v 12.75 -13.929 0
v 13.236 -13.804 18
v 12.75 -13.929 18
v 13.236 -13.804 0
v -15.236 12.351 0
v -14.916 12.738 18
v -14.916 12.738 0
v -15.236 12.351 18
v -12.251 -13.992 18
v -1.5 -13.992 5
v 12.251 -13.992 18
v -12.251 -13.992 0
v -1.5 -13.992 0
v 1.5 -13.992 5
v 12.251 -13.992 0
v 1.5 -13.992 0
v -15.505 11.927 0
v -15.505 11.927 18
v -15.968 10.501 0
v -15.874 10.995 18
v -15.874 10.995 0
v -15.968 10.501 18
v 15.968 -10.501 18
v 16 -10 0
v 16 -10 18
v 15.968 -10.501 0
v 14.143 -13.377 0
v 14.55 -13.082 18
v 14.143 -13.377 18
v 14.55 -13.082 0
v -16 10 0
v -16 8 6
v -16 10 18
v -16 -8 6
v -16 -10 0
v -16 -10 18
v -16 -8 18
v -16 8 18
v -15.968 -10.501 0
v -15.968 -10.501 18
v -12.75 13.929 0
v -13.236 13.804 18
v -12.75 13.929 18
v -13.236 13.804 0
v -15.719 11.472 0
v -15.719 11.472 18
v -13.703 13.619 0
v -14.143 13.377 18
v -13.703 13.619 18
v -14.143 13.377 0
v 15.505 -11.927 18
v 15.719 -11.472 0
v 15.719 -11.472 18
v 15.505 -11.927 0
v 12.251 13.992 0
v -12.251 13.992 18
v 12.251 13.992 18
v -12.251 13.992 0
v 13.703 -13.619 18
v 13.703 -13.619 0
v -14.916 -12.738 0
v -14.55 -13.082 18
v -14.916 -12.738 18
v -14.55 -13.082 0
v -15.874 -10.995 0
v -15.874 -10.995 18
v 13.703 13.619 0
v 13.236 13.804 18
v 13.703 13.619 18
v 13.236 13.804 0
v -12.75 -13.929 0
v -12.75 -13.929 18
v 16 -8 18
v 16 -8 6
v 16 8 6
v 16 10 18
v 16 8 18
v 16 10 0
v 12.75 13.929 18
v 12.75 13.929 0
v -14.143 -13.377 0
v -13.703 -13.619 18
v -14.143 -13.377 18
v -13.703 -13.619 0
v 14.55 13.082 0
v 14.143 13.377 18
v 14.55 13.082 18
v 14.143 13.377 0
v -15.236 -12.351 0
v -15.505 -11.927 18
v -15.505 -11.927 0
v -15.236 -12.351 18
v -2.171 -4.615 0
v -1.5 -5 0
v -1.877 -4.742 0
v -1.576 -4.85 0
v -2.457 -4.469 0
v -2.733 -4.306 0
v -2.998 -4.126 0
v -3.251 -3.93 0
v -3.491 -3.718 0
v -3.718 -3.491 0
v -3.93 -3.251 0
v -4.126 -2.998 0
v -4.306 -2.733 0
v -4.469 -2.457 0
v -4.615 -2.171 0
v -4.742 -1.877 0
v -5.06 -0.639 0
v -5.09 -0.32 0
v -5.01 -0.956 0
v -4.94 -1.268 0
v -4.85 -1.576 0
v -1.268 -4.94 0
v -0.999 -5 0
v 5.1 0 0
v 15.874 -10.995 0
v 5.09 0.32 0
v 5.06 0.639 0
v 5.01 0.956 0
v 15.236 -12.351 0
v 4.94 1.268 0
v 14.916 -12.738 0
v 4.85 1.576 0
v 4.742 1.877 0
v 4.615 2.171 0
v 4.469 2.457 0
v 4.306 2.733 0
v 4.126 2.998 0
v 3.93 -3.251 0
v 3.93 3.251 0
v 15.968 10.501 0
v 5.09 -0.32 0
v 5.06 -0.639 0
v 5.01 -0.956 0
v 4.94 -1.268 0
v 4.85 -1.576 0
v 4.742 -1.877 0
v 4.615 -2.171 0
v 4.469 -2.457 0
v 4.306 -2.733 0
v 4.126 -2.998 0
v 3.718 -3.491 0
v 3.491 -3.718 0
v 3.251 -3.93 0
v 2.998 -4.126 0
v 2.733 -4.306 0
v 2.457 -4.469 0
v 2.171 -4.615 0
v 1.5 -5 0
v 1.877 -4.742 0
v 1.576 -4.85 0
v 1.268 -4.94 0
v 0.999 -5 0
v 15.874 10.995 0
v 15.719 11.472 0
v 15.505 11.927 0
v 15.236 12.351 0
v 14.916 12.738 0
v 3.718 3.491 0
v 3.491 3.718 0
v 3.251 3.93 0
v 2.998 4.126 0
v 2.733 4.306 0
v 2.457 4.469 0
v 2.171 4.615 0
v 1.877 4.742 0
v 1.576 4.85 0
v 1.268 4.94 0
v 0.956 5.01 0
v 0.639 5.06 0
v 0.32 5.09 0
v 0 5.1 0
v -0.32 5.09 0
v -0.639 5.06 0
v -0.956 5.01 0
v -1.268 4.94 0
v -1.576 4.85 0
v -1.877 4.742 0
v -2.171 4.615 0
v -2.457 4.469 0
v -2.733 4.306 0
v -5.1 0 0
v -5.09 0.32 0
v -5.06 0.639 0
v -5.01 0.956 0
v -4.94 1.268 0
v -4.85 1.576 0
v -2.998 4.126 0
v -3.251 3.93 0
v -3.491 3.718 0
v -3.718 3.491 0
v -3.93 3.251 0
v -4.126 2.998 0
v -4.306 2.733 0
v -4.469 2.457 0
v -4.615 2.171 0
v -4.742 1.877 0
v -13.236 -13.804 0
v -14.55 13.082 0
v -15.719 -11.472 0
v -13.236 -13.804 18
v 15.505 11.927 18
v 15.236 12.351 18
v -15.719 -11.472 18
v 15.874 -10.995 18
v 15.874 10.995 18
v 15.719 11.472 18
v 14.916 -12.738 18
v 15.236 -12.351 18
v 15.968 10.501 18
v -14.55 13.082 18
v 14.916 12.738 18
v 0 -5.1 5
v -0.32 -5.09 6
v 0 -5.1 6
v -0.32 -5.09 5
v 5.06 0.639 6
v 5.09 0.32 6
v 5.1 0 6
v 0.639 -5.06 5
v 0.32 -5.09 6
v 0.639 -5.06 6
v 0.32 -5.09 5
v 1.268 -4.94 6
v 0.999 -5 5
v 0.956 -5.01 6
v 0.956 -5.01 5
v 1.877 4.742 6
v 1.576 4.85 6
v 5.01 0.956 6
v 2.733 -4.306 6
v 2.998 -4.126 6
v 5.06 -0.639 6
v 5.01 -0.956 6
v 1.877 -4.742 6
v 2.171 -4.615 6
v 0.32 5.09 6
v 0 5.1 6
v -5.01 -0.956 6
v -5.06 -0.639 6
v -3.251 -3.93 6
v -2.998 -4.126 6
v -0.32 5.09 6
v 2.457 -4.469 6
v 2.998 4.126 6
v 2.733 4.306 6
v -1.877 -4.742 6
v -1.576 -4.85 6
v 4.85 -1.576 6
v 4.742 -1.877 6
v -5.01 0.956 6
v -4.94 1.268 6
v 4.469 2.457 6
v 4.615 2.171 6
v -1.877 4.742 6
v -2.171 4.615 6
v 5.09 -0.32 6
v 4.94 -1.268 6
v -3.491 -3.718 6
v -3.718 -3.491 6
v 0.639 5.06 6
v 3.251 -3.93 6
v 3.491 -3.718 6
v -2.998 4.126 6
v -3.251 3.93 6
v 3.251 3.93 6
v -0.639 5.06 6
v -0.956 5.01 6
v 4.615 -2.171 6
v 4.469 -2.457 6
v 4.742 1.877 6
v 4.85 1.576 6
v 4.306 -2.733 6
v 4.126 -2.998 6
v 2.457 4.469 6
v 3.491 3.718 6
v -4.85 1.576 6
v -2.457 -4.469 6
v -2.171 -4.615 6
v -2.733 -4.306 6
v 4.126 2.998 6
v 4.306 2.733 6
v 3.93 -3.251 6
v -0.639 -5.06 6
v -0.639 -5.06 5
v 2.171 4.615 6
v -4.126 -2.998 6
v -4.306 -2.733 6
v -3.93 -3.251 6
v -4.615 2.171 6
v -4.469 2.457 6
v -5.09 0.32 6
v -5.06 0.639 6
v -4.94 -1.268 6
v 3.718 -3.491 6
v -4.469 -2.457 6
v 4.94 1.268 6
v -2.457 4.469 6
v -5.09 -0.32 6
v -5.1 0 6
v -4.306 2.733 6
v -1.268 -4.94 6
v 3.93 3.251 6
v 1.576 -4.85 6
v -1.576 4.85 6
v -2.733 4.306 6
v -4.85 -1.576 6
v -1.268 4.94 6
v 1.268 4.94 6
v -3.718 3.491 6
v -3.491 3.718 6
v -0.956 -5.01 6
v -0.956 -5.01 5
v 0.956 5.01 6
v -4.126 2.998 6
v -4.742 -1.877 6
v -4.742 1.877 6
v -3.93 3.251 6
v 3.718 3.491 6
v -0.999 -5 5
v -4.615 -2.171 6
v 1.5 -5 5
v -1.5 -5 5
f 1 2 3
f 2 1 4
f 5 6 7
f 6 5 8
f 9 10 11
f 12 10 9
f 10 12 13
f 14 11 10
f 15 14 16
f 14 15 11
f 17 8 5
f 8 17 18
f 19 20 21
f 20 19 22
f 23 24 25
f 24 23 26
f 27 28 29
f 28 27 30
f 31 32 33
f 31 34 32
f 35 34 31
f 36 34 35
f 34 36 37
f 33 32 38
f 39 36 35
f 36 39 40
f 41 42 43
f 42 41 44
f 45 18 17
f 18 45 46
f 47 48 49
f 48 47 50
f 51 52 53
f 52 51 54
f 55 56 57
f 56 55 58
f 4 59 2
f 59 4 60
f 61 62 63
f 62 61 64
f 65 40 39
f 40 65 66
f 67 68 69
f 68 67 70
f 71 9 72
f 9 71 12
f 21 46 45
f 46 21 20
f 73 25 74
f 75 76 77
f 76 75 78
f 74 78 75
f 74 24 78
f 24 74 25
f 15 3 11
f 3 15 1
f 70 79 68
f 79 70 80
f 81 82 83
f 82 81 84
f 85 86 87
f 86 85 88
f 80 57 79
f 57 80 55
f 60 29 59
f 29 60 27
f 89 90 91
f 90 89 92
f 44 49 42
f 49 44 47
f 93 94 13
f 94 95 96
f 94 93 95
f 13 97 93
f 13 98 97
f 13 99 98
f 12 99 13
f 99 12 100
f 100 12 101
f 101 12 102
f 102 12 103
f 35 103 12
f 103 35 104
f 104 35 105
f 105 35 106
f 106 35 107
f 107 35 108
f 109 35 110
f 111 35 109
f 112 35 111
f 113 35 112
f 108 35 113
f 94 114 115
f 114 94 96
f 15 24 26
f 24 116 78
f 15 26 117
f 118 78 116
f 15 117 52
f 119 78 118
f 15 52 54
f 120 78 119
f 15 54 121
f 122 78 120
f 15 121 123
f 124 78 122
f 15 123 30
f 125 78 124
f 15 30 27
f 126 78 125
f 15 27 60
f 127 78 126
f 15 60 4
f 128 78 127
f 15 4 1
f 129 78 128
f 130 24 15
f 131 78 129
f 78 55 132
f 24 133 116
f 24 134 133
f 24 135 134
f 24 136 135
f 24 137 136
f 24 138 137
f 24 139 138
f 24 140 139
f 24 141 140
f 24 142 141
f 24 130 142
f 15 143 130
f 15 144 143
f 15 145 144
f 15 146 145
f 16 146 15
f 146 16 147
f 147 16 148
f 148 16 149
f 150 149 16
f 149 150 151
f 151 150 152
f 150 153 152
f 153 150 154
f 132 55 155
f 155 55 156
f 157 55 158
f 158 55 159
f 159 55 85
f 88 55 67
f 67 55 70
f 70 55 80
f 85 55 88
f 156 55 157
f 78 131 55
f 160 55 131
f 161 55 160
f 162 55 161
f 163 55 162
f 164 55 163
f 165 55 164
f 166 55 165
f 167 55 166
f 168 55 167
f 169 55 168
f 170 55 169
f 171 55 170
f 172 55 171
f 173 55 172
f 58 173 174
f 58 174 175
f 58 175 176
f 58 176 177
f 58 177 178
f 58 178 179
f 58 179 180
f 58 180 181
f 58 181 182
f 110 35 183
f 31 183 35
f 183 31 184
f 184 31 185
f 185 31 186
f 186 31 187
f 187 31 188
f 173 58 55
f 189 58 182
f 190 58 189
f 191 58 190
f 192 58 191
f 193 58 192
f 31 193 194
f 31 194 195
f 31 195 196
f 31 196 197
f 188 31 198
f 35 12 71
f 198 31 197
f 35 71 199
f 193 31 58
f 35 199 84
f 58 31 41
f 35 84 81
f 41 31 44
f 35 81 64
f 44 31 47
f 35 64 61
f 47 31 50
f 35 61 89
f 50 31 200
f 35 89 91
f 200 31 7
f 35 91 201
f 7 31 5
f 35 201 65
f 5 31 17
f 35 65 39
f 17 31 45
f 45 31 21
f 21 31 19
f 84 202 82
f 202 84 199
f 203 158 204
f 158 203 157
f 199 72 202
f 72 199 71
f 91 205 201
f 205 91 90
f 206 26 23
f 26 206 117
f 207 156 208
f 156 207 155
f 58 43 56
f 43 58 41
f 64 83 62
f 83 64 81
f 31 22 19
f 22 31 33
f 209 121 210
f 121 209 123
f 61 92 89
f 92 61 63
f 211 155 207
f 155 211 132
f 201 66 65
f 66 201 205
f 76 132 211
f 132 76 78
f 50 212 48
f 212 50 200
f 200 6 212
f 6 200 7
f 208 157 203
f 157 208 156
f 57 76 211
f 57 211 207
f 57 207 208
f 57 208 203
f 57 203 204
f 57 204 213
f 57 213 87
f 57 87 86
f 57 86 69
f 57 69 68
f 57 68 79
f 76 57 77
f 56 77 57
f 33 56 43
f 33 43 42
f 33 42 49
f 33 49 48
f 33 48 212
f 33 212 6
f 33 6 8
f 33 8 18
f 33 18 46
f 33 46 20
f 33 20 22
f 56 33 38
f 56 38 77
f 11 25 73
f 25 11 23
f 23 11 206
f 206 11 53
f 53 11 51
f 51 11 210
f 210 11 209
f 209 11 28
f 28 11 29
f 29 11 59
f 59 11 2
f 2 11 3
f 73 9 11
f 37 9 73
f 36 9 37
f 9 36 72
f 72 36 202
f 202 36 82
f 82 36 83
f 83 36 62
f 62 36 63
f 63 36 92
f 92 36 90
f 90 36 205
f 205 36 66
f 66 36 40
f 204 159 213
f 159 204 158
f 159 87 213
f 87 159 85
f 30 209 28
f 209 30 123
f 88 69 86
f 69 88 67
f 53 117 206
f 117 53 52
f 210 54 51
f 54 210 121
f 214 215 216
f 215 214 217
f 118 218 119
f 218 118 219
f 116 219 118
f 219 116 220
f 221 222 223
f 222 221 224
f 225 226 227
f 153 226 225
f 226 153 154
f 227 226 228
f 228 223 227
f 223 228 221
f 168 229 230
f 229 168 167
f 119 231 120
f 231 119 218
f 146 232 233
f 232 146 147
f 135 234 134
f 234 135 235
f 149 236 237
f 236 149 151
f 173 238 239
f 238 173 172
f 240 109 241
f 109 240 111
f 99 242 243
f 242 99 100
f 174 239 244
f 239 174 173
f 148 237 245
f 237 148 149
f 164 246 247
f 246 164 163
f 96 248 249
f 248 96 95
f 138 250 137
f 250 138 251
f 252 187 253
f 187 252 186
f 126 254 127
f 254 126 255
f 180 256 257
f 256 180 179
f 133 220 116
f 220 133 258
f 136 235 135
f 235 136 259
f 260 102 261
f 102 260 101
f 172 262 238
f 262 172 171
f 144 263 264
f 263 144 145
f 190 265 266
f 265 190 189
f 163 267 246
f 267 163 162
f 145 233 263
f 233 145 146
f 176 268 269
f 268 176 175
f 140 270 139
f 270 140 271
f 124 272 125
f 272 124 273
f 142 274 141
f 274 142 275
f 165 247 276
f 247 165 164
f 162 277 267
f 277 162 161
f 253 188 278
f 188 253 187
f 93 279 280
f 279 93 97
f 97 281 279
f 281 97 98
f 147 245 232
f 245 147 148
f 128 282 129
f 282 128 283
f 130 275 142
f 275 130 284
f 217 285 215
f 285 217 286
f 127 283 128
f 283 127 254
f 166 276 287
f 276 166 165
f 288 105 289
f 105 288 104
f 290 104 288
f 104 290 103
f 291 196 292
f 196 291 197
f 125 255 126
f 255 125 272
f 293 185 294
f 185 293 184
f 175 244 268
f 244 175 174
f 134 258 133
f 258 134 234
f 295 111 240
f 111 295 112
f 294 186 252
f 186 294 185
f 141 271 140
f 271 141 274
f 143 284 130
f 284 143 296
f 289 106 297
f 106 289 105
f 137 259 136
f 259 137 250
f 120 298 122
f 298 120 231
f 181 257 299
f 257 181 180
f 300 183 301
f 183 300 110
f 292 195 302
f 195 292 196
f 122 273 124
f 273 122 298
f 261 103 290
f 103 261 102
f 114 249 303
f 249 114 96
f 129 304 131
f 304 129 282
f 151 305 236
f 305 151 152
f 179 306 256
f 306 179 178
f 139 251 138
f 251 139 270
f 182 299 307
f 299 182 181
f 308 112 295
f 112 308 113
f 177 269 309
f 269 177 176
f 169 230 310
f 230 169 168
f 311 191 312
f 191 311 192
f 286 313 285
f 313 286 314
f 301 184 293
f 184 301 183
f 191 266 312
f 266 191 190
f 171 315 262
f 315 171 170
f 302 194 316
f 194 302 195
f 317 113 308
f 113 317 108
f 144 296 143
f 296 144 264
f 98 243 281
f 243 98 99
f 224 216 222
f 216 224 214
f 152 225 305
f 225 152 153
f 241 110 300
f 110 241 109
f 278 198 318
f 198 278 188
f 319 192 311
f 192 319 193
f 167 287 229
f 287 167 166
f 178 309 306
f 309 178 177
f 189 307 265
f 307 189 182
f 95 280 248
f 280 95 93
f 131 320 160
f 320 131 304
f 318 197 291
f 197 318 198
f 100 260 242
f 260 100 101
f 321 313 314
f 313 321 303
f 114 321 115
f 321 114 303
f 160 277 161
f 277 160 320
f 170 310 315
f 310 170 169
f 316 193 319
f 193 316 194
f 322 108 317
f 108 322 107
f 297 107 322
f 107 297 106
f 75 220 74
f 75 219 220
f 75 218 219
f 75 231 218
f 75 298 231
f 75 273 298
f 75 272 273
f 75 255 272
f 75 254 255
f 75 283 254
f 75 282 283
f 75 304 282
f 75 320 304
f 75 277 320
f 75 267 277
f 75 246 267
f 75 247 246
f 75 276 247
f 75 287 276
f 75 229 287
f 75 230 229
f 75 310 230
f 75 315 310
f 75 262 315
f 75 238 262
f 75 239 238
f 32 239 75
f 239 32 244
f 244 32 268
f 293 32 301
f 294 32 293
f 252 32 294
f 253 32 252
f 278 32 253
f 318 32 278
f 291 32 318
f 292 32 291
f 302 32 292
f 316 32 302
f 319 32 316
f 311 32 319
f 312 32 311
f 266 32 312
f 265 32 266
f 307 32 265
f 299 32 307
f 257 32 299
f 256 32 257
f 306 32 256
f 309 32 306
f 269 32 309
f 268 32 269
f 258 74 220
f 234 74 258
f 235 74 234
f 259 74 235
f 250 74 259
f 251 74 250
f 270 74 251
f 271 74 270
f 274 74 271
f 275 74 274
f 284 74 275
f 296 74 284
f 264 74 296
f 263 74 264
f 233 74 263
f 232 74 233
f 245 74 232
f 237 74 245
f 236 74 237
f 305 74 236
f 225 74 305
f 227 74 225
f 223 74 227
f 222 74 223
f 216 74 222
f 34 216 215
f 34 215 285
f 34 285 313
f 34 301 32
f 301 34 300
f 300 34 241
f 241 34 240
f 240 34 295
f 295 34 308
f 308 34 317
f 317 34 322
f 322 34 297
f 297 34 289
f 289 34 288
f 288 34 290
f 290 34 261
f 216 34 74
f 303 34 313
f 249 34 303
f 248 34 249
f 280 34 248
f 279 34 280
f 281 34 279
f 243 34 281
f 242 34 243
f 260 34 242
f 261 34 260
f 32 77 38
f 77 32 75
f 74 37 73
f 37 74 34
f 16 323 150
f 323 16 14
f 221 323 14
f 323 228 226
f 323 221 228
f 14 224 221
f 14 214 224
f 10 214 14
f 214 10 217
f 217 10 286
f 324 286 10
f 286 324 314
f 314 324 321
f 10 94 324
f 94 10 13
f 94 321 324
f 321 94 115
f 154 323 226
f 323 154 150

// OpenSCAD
// V53-Right Pacer "Force-Cut" Version
// For Vybronics VG1030001XH 

difference() {
    // 1. THE MAIN BLOCK (Rounded for comfort)
    hull() {
        translate([-12, -10, 0]) cylinder(r=4, h=18, $fn=50);
        translate([12, -10, 0])  cylinder(r=4, h=18, $fn=50);
        translate([-12, 10, 0])  cylinder(r=4, h=18, $fn=50);
        translate([12, 10, 0])   cylinder(r=4, h=18, $fn=50);
    }

    // 2. THE MOTOR THROUGH-HOLE (Drills all the way through)
    // We start at Z=-5 to ensure the bottom face is deleted
    translate([0, 0, -5]) 
        cylinder(d=10.2, h=15, $fn=100);

    // 3. THE BATTERY POD SLOT (The Clip)
    // We make the cube extra long (40mm) so it clears the side walls
    translate([-20, -8, 6]) 
        cube([40, 16, 15]); 

    // 4. WIRE TRENCH (Prevents wire snap)
    translate([0, -15, 2]) 
        cube([3, 20, 6], center=true);

    // 5. THE "R" MARKING
    // Cut 5mm deep to guarantee it appears in the STL
    translate([0, 0, 16]) 
        linear_extrude(height = 5) 
            text("R", size=10, font="Arial:style=Bold", halign="center", valign="center");
}
